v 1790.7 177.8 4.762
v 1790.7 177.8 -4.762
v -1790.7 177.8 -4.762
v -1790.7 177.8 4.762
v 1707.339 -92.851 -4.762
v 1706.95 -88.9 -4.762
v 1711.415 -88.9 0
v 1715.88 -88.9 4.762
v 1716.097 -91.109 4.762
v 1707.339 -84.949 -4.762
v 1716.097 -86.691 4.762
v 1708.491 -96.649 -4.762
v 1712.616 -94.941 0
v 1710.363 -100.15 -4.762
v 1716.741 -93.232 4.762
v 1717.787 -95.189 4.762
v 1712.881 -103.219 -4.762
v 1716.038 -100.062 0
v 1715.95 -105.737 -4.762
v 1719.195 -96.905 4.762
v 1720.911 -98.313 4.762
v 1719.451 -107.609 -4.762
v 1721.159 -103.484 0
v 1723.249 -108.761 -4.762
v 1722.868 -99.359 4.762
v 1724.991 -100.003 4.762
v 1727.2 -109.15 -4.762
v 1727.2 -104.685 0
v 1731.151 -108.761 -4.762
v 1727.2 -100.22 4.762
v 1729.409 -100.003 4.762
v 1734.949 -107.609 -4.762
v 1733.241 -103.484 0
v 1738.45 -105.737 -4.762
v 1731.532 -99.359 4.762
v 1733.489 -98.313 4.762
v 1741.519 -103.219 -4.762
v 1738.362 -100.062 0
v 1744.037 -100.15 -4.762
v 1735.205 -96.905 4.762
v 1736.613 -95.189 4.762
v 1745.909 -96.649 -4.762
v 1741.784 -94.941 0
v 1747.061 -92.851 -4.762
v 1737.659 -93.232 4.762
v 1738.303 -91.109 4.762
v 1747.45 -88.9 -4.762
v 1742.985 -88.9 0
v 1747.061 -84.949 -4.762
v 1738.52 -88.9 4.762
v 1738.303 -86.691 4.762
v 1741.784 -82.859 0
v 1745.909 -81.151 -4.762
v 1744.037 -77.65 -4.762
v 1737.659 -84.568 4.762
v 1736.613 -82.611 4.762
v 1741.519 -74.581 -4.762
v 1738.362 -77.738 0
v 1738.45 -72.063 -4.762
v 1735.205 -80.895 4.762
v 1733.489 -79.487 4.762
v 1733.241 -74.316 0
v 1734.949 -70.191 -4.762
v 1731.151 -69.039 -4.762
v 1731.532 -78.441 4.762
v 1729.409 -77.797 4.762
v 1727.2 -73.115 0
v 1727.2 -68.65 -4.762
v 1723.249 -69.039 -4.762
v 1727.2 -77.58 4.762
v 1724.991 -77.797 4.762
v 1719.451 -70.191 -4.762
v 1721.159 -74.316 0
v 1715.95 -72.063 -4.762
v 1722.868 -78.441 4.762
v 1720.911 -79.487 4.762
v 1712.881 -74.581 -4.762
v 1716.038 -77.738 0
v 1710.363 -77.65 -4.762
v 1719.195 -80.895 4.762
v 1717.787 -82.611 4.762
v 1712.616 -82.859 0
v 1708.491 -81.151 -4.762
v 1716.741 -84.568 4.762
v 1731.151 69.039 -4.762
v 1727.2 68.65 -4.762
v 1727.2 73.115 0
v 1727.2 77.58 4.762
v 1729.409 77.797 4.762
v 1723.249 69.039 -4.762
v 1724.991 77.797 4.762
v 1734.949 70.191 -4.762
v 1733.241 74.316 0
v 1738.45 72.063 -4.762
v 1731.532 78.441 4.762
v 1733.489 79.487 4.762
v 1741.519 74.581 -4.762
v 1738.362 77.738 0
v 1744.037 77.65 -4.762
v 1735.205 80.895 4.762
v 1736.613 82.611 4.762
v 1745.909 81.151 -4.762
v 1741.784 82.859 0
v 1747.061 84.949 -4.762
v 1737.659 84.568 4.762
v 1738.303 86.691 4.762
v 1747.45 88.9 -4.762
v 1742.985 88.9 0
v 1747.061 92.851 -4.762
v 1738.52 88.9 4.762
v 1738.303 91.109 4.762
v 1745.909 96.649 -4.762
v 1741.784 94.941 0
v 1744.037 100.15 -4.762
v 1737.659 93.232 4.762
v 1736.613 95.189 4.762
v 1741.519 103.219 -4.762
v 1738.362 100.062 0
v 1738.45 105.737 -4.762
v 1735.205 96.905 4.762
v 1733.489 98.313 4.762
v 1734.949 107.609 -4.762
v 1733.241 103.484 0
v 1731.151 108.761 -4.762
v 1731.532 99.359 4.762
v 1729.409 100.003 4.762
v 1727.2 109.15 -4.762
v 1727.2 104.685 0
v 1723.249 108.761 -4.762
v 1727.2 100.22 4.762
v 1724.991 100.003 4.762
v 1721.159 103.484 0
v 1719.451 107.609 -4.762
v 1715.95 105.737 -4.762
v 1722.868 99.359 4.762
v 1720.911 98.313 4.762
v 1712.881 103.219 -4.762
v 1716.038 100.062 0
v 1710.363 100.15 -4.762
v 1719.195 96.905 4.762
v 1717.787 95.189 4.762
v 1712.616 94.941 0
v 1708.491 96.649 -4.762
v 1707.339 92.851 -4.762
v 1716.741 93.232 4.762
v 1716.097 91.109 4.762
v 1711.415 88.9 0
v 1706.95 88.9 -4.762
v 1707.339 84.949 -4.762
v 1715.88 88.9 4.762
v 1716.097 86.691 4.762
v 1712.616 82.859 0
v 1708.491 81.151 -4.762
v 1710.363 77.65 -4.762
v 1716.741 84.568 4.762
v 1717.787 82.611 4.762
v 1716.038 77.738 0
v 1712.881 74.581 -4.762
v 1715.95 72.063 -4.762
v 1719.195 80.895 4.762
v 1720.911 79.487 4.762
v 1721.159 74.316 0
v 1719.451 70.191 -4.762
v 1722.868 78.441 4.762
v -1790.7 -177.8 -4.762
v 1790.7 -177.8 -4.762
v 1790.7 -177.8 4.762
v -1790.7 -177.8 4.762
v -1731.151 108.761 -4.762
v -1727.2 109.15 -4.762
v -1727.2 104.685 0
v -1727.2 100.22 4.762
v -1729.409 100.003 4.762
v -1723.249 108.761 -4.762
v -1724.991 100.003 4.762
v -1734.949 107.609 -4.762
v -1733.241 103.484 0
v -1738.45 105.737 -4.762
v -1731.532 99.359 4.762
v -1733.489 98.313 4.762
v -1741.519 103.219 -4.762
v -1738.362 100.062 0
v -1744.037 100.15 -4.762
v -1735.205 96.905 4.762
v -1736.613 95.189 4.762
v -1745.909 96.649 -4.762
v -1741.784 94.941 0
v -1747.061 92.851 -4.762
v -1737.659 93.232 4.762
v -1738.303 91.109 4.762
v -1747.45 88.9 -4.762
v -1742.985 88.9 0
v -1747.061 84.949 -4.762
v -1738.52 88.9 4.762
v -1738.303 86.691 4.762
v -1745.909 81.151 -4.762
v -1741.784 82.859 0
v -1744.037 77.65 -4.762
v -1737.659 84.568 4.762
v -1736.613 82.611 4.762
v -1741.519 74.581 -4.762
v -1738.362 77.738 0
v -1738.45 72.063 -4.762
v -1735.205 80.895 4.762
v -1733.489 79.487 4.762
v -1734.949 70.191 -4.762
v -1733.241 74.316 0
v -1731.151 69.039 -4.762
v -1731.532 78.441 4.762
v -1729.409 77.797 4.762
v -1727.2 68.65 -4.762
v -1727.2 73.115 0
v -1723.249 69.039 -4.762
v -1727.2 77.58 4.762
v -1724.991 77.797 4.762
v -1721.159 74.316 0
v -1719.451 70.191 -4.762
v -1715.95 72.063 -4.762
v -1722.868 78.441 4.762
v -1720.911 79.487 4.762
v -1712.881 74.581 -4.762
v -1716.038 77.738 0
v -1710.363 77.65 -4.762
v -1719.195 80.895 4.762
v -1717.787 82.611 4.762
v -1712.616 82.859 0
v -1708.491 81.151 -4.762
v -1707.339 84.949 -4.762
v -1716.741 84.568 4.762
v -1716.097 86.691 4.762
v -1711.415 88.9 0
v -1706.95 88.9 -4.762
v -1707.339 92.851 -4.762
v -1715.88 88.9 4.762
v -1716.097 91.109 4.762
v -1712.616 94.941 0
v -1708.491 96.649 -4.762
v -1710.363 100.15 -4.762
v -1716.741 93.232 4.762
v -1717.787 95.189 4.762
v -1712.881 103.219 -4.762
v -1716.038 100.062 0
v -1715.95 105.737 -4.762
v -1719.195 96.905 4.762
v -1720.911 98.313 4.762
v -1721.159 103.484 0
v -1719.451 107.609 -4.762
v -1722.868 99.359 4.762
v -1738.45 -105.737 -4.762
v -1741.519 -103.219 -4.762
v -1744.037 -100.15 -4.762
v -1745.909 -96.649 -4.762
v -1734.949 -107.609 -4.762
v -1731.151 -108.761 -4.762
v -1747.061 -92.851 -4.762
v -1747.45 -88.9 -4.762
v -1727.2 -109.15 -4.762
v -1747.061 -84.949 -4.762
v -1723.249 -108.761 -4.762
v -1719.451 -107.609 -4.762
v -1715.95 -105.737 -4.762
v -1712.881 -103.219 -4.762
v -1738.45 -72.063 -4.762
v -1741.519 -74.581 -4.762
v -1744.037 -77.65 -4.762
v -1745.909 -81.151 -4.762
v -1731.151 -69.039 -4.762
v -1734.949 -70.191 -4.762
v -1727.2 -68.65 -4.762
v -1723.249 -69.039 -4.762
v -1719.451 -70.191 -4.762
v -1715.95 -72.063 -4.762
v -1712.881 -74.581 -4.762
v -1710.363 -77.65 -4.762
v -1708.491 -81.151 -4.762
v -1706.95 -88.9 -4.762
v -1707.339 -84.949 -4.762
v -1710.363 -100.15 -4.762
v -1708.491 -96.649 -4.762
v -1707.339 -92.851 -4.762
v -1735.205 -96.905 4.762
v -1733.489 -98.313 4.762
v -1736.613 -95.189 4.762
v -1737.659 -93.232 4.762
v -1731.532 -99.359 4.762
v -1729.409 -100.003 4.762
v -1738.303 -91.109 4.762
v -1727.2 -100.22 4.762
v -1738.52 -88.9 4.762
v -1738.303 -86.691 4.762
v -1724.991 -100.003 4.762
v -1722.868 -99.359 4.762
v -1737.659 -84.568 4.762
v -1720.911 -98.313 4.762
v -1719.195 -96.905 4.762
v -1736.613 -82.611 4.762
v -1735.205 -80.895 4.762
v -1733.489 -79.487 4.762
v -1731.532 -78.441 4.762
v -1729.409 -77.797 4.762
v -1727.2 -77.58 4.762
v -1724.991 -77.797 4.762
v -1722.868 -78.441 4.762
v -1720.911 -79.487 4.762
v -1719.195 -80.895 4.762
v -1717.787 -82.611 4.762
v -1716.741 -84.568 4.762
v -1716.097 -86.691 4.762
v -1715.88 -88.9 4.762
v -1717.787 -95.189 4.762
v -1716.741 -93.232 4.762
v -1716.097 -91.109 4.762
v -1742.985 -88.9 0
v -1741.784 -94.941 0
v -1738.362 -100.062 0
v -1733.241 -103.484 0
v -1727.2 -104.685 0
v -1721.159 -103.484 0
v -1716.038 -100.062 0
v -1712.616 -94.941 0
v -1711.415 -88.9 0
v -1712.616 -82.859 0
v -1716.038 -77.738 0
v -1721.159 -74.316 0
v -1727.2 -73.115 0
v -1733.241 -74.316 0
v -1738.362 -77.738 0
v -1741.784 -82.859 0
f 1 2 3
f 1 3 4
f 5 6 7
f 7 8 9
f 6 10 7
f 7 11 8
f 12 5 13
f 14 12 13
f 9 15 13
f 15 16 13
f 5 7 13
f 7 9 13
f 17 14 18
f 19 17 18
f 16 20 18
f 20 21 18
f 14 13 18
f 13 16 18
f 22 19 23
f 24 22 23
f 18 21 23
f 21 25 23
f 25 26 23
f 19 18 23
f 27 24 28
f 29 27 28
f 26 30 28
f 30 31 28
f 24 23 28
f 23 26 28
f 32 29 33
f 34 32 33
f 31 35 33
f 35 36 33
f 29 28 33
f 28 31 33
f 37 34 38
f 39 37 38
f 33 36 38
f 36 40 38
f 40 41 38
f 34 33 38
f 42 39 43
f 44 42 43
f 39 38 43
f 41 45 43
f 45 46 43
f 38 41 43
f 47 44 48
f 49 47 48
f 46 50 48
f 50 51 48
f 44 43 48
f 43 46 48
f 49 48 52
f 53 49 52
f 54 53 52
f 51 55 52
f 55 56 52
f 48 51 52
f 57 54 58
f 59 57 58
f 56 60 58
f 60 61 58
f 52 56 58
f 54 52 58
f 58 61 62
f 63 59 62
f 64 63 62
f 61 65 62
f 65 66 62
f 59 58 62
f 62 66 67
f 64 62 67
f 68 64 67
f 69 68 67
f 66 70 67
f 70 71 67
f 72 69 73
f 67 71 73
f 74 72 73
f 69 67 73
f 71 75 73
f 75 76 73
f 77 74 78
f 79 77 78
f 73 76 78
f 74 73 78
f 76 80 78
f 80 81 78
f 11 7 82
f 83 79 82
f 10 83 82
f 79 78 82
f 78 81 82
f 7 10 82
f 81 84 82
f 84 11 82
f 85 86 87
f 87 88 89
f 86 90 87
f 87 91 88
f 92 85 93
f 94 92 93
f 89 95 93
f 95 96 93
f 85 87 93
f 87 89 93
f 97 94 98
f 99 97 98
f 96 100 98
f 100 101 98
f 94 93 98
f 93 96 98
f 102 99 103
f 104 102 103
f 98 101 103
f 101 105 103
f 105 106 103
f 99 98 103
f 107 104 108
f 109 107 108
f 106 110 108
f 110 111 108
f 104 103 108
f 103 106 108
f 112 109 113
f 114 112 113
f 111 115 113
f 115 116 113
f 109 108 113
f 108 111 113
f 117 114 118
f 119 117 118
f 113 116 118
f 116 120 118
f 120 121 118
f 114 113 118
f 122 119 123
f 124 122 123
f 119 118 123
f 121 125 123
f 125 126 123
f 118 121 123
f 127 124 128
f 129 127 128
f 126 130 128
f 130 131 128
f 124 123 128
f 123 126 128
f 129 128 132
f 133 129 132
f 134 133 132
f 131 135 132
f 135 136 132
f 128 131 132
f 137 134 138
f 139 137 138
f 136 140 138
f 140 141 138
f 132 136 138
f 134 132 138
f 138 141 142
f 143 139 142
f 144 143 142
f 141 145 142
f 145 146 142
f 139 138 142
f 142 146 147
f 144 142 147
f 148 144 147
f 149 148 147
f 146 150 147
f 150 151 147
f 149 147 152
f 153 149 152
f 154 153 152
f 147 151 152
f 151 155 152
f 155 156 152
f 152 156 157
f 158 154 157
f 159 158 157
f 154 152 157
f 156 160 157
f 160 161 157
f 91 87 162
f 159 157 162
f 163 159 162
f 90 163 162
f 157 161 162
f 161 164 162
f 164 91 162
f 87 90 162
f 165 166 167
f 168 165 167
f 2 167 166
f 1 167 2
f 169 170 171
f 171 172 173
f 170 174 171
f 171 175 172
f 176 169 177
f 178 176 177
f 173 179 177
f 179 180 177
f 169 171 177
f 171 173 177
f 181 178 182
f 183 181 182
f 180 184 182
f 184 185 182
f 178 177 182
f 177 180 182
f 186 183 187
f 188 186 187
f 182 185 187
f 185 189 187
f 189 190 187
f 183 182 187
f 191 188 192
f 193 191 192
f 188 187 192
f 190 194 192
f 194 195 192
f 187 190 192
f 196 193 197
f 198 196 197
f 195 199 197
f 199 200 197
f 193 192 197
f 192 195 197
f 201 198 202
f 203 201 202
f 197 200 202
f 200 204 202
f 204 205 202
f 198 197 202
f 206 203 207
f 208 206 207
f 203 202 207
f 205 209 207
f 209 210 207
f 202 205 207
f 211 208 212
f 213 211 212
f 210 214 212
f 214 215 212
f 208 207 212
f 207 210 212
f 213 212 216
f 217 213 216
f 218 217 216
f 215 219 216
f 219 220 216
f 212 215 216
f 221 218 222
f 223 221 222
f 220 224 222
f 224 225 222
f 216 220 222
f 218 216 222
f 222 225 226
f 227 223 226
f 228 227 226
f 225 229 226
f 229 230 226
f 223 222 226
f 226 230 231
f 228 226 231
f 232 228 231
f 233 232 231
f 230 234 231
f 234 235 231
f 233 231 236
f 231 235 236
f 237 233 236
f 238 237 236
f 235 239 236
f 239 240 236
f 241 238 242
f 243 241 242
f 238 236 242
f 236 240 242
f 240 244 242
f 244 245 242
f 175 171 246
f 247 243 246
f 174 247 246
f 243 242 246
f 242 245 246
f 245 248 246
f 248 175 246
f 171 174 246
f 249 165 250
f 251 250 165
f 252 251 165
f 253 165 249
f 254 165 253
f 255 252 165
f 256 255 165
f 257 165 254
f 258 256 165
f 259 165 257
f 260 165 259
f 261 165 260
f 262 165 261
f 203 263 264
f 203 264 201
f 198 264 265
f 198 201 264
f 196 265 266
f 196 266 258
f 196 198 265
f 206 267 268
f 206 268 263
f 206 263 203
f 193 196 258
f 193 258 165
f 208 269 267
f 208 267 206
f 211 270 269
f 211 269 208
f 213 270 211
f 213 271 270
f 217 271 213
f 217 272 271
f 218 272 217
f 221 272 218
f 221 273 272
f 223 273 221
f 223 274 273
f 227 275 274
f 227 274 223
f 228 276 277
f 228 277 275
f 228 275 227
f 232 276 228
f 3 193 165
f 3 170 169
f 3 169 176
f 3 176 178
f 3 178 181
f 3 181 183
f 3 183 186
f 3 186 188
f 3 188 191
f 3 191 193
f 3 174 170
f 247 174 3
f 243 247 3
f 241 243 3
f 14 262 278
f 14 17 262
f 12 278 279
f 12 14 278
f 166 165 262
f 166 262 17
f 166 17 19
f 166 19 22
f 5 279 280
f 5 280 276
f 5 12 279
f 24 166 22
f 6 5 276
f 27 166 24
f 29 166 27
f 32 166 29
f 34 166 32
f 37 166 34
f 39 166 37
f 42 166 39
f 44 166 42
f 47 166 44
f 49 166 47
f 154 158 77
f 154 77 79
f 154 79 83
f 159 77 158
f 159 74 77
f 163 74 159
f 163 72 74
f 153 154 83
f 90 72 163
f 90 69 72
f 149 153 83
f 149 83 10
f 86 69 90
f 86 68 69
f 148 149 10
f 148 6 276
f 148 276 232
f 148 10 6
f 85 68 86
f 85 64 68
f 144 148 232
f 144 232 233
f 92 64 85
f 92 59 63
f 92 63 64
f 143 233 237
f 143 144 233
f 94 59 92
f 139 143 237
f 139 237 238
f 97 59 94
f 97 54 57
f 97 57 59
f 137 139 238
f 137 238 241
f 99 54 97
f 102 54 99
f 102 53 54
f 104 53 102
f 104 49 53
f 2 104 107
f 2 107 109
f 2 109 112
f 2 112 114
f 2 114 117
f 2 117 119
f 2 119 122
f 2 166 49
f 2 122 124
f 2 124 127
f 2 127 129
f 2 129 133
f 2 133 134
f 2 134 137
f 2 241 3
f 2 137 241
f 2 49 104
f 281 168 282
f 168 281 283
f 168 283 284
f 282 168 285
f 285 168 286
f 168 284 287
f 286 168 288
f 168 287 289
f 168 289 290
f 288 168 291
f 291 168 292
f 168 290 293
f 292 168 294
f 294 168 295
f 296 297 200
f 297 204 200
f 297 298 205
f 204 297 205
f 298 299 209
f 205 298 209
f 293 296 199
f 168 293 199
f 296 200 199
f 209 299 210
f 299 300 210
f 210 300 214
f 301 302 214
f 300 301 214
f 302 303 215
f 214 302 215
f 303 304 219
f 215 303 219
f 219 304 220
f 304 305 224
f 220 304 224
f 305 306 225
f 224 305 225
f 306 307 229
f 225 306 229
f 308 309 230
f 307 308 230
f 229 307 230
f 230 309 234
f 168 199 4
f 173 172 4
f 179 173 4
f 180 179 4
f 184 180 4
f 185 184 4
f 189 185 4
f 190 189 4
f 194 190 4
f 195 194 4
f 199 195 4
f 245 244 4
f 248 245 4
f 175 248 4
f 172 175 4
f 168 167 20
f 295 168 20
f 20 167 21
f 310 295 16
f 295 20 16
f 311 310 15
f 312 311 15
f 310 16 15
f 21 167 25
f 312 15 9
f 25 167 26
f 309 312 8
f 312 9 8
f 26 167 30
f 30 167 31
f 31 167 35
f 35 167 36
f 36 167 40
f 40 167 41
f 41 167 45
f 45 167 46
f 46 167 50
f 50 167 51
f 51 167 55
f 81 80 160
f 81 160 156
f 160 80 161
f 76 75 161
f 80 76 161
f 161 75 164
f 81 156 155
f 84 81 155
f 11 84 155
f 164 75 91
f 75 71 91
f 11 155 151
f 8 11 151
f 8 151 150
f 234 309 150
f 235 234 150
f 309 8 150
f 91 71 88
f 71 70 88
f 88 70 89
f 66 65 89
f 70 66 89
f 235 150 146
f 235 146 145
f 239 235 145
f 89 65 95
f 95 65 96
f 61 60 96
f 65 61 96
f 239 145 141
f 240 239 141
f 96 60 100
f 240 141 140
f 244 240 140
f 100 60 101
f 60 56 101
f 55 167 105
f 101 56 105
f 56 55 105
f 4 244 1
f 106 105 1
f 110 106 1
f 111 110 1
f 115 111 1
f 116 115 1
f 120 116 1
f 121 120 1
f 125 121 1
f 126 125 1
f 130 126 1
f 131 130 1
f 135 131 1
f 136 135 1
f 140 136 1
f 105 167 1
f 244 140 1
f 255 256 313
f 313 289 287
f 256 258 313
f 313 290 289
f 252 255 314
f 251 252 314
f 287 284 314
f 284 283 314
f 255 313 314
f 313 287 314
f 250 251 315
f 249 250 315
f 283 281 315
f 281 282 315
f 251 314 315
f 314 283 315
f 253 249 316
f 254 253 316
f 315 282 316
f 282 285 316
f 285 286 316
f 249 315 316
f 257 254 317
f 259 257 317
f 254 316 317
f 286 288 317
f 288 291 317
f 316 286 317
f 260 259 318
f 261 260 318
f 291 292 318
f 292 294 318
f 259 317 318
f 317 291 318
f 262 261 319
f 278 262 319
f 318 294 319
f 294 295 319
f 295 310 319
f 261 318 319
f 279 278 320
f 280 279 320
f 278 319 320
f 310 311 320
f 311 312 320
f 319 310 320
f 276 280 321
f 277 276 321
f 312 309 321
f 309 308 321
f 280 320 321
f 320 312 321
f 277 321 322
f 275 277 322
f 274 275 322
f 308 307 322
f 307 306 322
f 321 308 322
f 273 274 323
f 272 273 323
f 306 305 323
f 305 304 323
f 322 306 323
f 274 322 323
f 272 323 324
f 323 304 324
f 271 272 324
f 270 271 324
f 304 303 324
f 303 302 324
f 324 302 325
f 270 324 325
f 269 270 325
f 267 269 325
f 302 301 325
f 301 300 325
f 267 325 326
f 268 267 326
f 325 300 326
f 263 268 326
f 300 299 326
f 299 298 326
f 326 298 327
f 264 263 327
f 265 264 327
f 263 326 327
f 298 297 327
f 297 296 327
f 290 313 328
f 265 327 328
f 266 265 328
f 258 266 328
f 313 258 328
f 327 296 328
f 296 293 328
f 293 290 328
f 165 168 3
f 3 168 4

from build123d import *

# Parameters (mm, degrees)
F0_W     = 355.6
F0_H     = 9.525
F1_DEPTH = 1790.7
F3_DEPTH = 25.4


# Not quite as in the source:
# - a fillet or chamfer that OpenCascade refuses, or shapes differently, is made with other operations: its cross-section is extruded or revolved along the edge and cut away or added


with BuildPart() as f1:
    # F0 (on Right) → F1 (new body, symmetric)
    with BuildSketch(Plane.YZ):
        Rectangle(F0_W, F0_H)
    extrude(amount=F1_DEPTH, both=True)

    # F2 (on face) → F3 (cut)
    with BuildSketch(Plane.XY.offset(4.7625)):
        with BuildLine():
            Line((-1727.2, 88.9), (-1735.5439, 88.9))
            ThreePointArc((-1735.5439, 88.9), (-1733.1000282715, 82.9999717285), (-1727.2, 80.5561))
            Line((-1727.2, 80.5561), (-1727.2, 88.9))
        make_face()
        with BuildLine():
            Line((-1718.8561, 88.9), (-1727.2, 88.9))
            Line((-1727.2, 88.9), (-1727.2, 80.5561))
            ThreePointArc((-1727.2, 80.5561), (-1721.2999717285, 82.9999717285), (-1718.8561, 88.9))
        make_face()
        with BuildLine():
            ThreePointArc((-1718.8561, 88.9), (-1721.2999717285, 94.8000282715), (-1727.2, 97.2439))
            Line((-1727.2, 97.2439), (-1727.2, 88.9))
            Line((-1727.2, 88.9), (-1718.8561, 88.9))
        make_face()
        with BuildLine():
            ThreePointArc((-1727.2, 97.2439), (-1733.1000282715, 94.8000282715), (-1735.5439, 88.9))
            Line((-1735.5439, 88.9), (-1727.2, 88.9))
            Line((-1727.2, 88.9), (-1727.2, 97.2439))
        make_face()
        with BuildLine():
            ThreePointArc((1735.5439, -88.9), (1733.1000282715, -82.9999717285), (1727.2, -80.5561))
            Line((1727.2, -80.5561), (1727.2, -88.9))
            Line((1727.2, -88.9), (1735.5439, -88.9))
        make_face()
        with BuildLine():
            ThreePointArc((1727.2, -80.5561), (1721.2999717285, -82.9999717285), (1718.8561, -88.9))
            Line((1718.8561, -88.9), (1727.2, -88.9))
            Line((1727.2, -88.9), (1727.2, -80.5561))
        make_face()
        with BuildLine():
            Line((1735.5439, -88.9), (1727.2, -88.9))
            Line((1727.2, -88.9), (1727.2, -97.2439))
            ThreePointArc((1727.2, -97.2439), (1733.1000282715, -94.8000282715), (1735.5439, -88.9))
        make_face()
        with BuildLine():
            Line((1727.2, -88.9), (1718.8561, -88.9))
            ThreePointArc((1718.8561, -88.9), (1721.2999717285, -94.8000282715), (1727.2, -97.2439))
            Line((1727.2, -97.2439), (1727.2, -88.9))
        make_face()
        with BuildLine():
            Line((1727.2, 88.9), (1718.8561, 88.9))
            ThreePointArc((1718.8561, 88.9), (1721.2999717285, 82.9999717285), (1727.2, 80.5561))
            Line((1727.2, 80.5561), (1727.2, 88.9))
        make_face()
        with BuildLine():
            Line((1727.2, 88.9), (1727.2, 97.2439))
            ThreePointArc((1727.2, 97.2439), (1721.2999717285, 94.8000282715), (1718.8561, 88.9))
            Line((1718.8561, 88.9), (1727.2, 88.9))
        make_face()
        with BuildLine():
            ThreePointArc((1735.5439, 88.9), (1733.1000282715, 94.8000282715), (1727.2, 97.2439))
            Line((1727.2, 97.2439), (1727.2, 88.9))
            Line((1727.2, 88.9), (1735.5439, 88.9))
        make_face()
        with BuildLine():
            Line((1735.5439, 88.9), (1727.2, 88.9))
            Line((1727.2, 88.9), (1727.2, 80.5561))
            ThreePointArc((1727.2, 80.5561), (1733.1000282715, 82.9999717285), (1735.5439, 88.9))
        make_face()
        with BuildLine():
            ThreePointArc((-1727.2, -80.5561), (-1733.1000282715, -82.9999717285), (-1735.5439, -88.9))
            Line((-1735.5439, -88.9), (-1727.2, -88.9))
            Line((-1727.2, -88.9), (-1727.2, -80.5561))
        make_face()
        with BuildLine():
            Line((-1727.2, -80.5561), (-1727.2, -88.9))
            Line((-1727.2, -88.9), (-1718.8561, -88.9))
            ThreePointArc((-1718.8561, -88.9), (-1721.2999717285, -82.9999717285), (-1727.2, -80.5561))
        make_face()
        with BuildLine():
            Line((-1718.8561, -88.9), (-1727.2, -88.9))
            Line((-1727.2, -88.9), (-1727.2, -97.2439))
            ThreePointArc((-1727.2, -97.2439), (-1721.2999717285, -94.8000282715), (-1718.8561, -88.9))
        make_face()
        with BuildLine():
            Line((-1727.2, -88.9), (-1735.5439, -88.9))
            ThreePointArc((-1735.5439, -88.9), (-1733.1000282715, -94.8000282715), (-1727.2, -97.2439))
            Line((-1727.2, -97.2439), (-1727.2, -88.9))
        make_face()
    extrude(amount=-F3_DEPTH, mode=Mode.SUBTRACT)

    # F4: chamfer of 12.7 x 11.9060876876 on 4 edges, made by hand

    # F4_s1 → F4_t2 (revolve, cut)
    with BuildSketch(Plane.XZ.offset(88.9)):
        Polygon((-1747.4499876876, -4.7625), (-1735.5439, 7.9375), (-1735.5439, -4.7625), align=None)
    revolve(axis=Axis((-1727.2, -88.9, -4.7625), (0, 0, 1)), mode=Mode.SUBTRACT)

    # F4_s3 → F4_t4 (revolve, cut)
    with BuildSketch(Plane.YZ.offset(-1727.2)):
        Polygon((109.1499876876, -4.7625), (97.2439, 7.9375), (97.2439, -4.7625), align=None)
    revolve(axis=Axis((-1727.2, 88.9, -4.7625), (0, 0, 1)), mode=Mode.SUBTRACT)

    # F4_s5 → F4_t6 (revolve, cut)
    with BuildSketch(Plane.YZ.offset(1727.2)):
        Polygon((68.6500123124, -4.7625), (80.5561, 7.9375), (80.5561, -4.7625), align=None)
    revolve(axis=Axis((1727.2, 88.9, -4.7625), (0, 0, 1)), mode=Mode.SUBTRACT)

    # F4_s7 → F4_t8 (revolve, cut)
    with BuildSketch(Plane.XZ.offset(88.9)):
        Polygon((1706.9500123124, -4.7625), (1718.8561, 7.9375), (1718.8561, -4.7625), align=None)
    revolve(axis=Axis((1727.2, -88.9, -4.7625), (0, 0, 1)), mode=Mode.SUBTRACT)


solid = f1.part
